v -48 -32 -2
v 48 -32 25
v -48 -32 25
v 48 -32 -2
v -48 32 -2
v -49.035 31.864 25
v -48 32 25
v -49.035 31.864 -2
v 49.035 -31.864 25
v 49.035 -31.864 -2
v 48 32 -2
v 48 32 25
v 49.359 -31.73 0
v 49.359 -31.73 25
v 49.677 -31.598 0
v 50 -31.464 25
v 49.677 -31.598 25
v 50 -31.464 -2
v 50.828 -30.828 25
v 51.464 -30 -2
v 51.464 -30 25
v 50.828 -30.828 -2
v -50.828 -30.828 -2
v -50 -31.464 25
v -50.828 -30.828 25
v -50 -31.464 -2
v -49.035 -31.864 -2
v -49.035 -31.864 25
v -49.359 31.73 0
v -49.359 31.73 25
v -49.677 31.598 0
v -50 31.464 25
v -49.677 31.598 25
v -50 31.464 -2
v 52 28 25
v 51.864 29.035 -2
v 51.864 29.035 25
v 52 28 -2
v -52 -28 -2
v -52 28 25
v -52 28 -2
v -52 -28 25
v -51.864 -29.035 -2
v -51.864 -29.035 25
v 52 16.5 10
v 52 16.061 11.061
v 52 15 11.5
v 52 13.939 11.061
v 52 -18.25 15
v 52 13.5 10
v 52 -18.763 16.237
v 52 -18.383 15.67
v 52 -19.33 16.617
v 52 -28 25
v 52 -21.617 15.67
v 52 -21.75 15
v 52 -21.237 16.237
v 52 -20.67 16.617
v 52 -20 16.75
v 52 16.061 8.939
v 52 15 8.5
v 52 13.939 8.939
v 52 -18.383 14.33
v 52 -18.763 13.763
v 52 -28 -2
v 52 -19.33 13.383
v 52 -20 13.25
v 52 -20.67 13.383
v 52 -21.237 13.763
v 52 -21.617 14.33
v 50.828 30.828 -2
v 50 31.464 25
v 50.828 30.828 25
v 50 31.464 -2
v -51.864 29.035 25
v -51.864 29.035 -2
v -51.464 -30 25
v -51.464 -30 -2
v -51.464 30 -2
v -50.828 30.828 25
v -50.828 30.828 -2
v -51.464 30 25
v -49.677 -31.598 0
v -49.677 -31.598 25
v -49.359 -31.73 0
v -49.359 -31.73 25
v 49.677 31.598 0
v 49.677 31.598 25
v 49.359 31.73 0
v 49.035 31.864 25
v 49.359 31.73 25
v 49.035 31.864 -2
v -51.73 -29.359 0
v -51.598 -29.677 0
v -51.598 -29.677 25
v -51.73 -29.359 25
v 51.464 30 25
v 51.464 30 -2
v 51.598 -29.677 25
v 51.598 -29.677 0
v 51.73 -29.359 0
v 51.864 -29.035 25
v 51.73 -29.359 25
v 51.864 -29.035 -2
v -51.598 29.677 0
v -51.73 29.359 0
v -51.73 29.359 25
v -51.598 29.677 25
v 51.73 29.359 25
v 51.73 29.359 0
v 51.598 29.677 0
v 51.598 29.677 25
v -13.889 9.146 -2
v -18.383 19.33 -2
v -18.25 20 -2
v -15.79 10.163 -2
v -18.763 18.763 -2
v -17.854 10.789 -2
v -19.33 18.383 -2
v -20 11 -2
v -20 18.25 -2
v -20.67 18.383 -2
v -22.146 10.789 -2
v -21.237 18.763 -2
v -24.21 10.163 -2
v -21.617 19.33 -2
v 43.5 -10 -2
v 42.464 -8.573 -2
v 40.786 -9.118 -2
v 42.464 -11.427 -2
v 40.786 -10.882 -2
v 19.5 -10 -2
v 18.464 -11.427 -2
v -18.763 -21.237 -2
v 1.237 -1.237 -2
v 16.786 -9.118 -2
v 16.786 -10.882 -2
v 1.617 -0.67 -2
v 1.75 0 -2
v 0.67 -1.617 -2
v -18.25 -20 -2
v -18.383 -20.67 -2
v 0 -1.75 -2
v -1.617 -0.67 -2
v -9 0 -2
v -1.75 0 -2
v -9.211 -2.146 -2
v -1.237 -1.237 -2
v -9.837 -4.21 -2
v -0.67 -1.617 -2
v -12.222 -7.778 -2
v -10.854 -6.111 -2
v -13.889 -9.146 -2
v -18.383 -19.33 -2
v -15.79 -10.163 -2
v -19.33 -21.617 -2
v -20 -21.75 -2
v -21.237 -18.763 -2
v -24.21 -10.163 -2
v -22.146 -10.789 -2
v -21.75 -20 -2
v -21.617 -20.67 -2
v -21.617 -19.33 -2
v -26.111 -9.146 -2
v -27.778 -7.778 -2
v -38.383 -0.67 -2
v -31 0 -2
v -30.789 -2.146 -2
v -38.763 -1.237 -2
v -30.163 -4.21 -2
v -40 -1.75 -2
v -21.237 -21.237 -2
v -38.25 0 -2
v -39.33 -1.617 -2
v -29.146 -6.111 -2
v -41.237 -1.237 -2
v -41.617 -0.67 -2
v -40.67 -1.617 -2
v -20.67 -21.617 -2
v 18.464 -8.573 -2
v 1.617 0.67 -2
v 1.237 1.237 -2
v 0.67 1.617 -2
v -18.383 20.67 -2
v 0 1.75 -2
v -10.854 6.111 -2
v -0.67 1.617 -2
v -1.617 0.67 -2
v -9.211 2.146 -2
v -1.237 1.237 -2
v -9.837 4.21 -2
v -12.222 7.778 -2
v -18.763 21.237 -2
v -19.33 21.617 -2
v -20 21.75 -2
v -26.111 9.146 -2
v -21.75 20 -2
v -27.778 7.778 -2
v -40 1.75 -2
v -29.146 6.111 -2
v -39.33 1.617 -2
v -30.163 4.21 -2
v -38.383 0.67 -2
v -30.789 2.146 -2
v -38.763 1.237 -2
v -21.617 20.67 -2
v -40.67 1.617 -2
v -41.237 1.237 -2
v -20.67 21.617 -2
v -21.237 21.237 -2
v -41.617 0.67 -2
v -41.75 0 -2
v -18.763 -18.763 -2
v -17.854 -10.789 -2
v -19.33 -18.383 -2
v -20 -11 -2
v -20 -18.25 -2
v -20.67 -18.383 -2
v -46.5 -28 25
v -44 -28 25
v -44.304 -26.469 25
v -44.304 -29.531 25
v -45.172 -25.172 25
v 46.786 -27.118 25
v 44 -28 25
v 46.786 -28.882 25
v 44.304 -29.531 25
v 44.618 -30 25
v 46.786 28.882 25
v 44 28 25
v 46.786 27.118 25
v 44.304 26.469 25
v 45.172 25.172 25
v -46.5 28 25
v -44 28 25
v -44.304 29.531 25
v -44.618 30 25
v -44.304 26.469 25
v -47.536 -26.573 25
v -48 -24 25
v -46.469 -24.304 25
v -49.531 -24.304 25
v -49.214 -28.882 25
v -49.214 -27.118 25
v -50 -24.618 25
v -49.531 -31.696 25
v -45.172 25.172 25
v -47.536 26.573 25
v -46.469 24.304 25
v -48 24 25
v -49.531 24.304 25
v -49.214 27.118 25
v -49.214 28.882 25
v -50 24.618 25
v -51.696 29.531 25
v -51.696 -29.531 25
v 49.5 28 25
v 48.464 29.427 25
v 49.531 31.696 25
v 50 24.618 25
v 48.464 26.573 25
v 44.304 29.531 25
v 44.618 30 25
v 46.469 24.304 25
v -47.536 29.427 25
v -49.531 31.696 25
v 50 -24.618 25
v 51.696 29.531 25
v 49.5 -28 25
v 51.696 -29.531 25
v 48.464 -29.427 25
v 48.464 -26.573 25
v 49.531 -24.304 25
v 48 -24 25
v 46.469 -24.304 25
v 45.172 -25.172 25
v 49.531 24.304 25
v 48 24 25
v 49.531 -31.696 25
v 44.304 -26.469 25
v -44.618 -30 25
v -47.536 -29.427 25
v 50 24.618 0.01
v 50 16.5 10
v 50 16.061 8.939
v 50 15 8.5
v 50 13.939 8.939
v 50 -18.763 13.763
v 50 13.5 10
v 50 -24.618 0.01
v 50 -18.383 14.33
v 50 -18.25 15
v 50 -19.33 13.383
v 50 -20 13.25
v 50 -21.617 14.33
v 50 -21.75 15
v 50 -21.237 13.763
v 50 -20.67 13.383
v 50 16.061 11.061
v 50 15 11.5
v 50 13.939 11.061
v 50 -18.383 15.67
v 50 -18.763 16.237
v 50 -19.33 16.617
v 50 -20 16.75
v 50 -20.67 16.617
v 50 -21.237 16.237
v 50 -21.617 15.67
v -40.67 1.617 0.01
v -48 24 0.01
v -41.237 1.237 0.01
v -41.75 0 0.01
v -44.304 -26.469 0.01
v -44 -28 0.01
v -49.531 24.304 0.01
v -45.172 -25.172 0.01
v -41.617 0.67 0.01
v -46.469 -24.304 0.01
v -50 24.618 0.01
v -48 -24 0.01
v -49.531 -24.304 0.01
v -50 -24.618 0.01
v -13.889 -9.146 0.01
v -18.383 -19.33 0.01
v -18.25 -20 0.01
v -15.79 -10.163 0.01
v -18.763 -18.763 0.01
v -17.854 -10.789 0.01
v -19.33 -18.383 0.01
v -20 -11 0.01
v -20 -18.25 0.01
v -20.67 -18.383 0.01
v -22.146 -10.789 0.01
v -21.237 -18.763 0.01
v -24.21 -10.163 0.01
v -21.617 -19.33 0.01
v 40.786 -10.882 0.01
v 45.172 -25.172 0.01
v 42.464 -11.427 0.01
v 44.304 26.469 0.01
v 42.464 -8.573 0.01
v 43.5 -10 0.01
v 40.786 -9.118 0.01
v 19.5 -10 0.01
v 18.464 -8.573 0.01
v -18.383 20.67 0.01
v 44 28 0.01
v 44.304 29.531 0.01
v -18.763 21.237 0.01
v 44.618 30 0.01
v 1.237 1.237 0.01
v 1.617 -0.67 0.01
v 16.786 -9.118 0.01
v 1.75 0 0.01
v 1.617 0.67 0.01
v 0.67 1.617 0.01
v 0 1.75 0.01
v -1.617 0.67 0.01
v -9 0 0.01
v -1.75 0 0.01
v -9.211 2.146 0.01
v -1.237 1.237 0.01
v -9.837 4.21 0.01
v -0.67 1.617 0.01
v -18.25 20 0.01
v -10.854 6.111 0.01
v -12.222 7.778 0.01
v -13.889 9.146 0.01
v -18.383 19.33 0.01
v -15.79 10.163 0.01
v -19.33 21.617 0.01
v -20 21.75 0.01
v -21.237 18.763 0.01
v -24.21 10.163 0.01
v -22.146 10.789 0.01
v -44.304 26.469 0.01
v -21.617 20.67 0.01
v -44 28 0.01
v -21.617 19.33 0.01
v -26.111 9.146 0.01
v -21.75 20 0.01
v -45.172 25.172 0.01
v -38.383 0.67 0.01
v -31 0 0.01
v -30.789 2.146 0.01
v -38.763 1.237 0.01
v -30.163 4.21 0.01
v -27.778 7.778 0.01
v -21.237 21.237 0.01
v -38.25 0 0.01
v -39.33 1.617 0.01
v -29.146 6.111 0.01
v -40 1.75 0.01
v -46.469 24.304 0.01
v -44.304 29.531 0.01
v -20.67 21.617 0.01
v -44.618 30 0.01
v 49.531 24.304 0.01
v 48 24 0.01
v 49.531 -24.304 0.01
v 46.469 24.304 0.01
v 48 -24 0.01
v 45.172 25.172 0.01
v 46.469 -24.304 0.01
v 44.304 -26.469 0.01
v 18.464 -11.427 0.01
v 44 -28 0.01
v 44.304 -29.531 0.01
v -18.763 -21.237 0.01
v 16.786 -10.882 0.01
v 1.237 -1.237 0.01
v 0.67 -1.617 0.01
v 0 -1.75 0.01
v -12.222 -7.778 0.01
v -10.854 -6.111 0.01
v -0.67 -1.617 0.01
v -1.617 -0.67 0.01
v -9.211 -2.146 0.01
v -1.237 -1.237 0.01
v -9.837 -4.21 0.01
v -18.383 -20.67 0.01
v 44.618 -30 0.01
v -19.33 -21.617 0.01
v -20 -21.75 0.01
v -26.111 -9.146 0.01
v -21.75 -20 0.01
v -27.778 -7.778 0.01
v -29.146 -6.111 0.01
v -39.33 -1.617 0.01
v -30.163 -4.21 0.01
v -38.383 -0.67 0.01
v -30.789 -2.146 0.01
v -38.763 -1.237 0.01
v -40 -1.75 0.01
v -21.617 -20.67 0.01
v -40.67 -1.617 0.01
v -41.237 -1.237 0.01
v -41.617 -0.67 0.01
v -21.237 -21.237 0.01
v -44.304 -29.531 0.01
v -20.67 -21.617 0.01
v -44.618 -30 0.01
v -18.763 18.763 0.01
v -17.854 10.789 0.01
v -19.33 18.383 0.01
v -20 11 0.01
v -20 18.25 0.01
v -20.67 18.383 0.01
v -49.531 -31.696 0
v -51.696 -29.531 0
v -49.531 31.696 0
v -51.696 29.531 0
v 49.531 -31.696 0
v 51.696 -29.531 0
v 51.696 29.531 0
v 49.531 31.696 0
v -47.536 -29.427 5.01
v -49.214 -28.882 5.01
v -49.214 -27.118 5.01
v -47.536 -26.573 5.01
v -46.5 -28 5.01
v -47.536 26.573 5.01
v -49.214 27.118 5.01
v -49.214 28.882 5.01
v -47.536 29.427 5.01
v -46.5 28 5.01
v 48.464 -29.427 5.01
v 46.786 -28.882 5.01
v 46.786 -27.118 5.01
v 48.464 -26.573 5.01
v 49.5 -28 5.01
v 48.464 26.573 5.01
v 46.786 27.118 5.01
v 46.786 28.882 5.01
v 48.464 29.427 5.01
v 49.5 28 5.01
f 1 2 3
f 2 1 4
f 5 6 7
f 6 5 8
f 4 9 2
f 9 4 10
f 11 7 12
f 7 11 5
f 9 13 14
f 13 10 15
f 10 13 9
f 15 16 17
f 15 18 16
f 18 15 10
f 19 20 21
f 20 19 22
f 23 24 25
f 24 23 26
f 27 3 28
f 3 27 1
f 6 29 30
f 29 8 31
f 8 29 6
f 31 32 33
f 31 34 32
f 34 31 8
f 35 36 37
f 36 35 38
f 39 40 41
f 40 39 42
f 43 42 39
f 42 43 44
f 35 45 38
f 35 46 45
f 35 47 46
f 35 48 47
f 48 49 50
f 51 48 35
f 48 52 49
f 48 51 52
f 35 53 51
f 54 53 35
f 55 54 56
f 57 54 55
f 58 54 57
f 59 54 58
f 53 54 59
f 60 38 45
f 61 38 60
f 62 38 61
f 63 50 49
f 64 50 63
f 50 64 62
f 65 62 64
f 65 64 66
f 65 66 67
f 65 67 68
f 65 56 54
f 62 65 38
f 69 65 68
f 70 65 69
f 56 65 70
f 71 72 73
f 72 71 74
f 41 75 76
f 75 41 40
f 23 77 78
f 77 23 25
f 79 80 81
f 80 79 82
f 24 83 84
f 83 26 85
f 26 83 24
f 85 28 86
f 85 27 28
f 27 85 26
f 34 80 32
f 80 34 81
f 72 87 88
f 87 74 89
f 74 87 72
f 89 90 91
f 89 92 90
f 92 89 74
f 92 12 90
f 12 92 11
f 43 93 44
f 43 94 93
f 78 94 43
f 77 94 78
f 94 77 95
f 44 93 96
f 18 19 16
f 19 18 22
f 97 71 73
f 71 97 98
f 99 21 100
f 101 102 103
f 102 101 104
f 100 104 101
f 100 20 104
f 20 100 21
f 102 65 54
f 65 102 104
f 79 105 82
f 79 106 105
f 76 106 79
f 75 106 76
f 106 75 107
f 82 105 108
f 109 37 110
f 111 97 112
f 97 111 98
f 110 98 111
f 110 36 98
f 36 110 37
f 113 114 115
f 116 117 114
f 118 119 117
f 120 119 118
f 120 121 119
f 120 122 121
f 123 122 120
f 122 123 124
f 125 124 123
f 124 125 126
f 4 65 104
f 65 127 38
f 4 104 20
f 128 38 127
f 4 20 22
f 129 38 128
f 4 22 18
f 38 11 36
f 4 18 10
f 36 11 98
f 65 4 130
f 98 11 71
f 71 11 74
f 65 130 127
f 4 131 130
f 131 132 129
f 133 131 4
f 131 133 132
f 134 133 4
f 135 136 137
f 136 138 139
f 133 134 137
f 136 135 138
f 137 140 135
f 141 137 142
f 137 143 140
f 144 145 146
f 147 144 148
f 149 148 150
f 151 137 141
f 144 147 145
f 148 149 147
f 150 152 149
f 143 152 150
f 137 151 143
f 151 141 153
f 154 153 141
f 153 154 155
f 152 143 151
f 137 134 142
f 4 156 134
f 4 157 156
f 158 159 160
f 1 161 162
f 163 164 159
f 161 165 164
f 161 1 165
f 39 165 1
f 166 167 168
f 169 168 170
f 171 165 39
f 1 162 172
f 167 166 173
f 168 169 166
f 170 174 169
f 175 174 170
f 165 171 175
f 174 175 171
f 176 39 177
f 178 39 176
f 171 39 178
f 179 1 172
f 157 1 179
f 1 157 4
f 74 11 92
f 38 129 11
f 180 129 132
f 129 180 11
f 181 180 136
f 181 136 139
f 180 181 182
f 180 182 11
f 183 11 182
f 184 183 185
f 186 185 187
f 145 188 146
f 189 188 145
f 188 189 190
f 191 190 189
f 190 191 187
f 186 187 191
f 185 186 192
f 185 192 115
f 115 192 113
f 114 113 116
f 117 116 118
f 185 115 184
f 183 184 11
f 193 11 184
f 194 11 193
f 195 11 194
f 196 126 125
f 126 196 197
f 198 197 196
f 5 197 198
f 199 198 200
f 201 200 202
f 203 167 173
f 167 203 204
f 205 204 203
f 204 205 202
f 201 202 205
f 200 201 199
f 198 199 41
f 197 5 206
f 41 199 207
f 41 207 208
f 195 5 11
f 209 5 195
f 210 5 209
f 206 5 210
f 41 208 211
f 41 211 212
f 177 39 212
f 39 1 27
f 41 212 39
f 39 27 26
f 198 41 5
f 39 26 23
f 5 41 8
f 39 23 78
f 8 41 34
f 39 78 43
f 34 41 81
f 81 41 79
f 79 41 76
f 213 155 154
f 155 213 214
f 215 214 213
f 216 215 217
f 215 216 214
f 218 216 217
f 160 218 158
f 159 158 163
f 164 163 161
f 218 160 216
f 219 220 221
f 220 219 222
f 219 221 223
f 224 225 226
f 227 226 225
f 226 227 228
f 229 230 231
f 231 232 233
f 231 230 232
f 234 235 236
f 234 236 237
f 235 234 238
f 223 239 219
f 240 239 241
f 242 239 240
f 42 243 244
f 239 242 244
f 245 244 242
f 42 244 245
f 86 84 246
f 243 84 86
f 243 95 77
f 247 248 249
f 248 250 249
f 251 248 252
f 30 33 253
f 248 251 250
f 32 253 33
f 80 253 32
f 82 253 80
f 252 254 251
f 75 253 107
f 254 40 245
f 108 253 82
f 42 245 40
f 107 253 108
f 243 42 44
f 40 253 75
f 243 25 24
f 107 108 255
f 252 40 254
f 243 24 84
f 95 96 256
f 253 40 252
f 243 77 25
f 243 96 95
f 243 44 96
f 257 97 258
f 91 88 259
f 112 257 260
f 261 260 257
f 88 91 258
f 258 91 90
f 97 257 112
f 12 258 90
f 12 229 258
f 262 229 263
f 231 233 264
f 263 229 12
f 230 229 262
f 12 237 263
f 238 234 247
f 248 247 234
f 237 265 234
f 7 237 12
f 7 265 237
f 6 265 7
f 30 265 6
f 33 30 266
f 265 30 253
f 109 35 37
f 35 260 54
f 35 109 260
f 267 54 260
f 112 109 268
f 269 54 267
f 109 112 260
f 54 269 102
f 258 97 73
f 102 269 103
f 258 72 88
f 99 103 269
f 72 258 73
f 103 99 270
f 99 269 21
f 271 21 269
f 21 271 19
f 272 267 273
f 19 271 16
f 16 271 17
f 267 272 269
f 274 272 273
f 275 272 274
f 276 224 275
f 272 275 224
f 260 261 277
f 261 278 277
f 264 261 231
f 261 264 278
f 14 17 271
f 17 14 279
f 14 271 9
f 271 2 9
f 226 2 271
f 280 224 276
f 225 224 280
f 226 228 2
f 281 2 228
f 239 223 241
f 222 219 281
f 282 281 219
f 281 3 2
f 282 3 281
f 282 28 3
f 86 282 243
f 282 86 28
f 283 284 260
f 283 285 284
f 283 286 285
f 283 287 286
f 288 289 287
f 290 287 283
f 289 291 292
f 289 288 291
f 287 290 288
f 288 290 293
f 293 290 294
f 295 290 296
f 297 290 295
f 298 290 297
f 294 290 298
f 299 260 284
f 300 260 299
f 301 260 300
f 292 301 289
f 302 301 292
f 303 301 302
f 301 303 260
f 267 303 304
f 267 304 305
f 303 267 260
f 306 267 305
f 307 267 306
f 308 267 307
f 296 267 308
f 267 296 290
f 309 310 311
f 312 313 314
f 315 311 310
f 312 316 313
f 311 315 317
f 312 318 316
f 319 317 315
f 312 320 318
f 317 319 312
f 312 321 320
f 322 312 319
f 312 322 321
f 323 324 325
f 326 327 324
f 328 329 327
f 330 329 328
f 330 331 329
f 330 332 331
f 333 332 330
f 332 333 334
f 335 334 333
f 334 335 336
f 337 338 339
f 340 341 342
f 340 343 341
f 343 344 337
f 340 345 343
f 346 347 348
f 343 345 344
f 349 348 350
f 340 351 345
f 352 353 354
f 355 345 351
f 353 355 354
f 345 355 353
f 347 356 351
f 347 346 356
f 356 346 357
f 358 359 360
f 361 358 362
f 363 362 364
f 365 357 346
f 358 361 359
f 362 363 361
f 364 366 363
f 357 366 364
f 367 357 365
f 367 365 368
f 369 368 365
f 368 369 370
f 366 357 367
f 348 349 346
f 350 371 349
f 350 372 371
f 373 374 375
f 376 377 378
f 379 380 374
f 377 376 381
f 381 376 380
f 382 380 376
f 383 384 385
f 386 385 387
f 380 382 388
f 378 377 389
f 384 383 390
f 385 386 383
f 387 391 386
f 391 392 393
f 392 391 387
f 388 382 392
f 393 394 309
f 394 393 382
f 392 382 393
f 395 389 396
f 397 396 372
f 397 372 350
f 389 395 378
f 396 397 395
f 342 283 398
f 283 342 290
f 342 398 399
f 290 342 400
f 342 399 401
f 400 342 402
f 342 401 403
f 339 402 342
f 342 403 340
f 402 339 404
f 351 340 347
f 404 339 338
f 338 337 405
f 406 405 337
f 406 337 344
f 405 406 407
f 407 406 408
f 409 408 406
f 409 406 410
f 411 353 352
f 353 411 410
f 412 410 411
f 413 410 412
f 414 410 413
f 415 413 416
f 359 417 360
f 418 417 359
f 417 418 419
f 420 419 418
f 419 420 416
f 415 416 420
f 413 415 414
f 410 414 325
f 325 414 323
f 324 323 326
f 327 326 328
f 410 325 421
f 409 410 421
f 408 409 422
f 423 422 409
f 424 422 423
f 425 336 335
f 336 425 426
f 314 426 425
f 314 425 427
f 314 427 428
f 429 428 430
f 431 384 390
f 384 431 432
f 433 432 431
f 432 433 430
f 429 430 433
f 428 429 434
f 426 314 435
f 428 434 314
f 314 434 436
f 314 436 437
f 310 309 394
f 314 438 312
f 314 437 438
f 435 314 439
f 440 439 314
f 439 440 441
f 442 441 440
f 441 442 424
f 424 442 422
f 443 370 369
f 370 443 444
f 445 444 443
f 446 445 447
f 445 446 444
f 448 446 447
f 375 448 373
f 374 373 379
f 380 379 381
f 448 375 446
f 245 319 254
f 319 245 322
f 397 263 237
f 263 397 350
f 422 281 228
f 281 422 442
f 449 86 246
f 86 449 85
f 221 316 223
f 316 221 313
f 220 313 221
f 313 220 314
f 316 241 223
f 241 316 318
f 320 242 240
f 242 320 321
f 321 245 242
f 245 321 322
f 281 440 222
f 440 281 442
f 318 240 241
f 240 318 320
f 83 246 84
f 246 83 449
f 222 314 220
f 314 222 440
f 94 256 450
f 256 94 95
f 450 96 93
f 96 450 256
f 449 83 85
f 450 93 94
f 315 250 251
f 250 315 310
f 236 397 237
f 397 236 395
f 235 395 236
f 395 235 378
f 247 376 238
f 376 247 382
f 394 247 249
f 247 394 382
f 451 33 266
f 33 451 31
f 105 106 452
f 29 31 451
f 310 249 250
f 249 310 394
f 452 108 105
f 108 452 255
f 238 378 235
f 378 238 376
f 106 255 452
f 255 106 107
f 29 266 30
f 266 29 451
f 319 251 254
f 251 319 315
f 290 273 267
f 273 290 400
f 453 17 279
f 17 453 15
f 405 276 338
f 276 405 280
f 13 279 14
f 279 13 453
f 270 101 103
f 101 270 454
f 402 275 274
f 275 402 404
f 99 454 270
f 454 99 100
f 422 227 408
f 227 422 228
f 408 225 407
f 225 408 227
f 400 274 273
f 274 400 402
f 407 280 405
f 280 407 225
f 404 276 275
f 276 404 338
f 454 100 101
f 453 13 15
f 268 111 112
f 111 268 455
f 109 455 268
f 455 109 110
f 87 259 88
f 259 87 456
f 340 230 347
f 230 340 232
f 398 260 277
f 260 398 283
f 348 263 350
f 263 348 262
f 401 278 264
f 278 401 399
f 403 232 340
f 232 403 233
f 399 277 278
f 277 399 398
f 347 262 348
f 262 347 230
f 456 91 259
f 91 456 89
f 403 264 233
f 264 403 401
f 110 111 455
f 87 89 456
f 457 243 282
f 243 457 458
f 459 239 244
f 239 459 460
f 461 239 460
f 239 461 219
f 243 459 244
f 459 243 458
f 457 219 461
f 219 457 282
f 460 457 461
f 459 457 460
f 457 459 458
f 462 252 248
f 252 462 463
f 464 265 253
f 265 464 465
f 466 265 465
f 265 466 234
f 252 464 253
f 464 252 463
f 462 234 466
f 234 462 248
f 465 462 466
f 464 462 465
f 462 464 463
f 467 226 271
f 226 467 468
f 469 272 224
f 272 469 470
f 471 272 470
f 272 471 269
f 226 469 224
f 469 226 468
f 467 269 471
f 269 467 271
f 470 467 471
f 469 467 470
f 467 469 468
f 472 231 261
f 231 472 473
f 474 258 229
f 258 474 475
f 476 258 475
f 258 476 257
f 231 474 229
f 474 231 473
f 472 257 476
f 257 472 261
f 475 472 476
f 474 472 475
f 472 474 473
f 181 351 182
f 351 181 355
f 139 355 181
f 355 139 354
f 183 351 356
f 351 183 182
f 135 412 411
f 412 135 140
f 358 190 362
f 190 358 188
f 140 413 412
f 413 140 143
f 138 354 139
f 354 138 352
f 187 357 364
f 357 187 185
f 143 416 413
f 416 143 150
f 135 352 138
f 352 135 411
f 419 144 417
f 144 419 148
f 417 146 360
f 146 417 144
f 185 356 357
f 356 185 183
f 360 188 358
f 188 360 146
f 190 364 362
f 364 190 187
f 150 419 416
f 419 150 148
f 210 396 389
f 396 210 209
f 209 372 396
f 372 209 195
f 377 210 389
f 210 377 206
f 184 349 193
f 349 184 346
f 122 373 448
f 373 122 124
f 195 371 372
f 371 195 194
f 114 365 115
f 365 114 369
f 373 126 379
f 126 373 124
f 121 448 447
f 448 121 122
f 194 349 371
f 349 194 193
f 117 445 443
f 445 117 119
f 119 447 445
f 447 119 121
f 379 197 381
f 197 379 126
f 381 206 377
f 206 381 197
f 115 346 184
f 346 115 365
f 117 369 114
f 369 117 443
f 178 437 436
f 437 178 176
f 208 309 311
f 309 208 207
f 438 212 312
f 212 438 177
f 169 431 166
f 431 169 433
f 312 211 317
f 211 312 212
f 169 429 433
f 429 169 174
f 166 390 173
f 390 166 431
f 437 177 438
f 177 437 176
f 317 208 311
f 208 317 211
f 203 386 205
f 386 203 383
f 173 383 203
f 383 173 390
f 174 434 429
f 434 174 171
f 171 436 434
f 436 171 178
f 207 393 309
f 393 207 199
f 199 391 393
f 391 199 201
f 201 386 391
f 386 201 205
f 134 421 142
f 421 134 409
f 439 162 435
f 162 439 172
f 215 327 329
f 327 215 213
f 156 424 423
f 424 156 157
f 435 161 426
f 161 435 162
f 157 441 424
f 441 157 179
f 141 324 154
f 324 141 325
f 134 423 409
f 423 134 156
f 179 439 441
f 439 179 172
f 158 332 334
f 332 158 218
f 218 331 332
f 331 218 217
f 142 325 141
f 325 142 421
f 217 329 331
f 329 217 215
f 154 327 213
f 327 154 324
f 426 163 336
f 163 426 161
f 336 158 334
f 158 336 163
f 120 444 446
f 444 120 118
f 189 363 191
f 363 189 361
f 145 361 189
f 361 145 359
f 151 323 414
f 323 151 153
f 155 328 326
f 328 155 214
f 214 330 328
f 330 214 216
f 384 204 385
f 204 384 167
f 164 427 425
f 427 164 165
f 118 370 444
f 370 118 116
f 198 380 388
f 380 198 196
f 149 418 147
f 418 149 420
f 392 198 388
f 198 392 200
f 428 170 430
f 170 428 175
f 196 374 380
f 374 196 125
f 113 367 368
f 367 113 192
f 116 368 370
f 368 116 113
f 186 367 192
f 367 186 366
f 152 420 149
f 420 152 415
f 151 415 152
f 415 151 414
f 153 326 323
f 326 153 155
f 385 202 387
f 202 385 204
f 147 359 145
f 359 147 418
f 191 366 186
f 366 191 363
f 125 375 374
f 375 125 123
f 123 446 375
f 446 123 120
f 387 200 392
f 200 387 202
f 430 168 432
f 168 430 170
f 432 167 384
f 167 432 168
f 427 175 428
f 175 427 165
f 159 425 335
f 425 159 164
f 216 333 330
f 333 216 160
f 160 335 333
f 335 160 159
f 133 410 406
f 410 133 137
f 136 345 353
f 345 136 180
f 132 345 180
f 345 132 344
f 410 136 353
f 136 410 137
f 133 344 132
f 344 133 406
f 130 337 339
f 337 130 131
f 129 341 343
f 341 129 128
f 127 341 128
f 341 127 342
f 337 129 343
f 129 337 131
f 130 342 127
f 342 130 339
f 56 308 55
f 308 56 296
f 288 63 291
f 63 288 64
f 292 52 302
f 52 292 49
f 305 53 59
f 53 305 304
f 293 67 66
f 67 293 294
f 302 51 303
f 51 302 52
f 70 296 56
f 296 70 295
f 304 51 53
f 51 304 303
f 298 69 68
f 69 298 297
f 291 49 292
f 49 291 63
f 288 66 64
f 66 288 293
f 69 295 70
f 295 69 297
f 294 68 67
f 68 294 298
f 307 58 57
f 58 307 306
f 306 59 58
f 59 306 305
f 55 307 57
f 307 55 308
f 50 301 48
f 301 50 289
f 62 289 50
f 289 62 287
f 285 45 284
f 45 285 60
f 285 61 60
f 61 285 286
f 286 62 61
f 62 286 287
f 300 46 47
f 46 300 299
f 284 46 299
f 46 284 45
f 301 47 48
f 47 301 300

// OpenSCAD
// file: thatbox.scad
module ThatBox_Layout(dims, corner_radius) {
  dx = (dims[0] / 2) - corner_radius;
  dy = (dims[1] / 2) - corner_radius;

  for(x = [-dx, dx]) {
    for(y = [-dy, dy]) {
      translate([x, y]) {
        children();
      }
    }
  }
}

module ThatBox_Plate(dims, thickness, corner_radius) {
  hull() {
    ThatBox_Layout(dims, corner_radius) {
      cylinder(h = thickness, r = corner_radius, $fn = 24);
    }
  }
}

function PlateSize(inner, wall_thickness) = [inner[0] + (wall_thickness * 2), inner[1] + (wall_thickness * 2)];

module ThatBox_Box(
  inner = [120, 80, 30],
  wall_thickness = 2, 
  corner_radius = 4,
  mounting_hole_diameter = 3,
  mounting_hole_depth = 20,
  base_thickness = 3, 
) {
  plate_size = PlateSize(inner, wall_thickness);

  difference() {
    // Outer volume
    translate([0, 0, -base_thickness]) {
      ThatBox_Plate(dims = plate_size, thickness = inner[2] + base_thickness, corner_radius = corner_radius);
    }

    // Inner volume
    translate([0, 0, (inner[2] / 2) + 0.01]) {
      cube(inner, center = true);
    }
  }

  difference() {
    // Mounting hole supports
    ThatBox_Layout(dims = plate_size, corner_radius = corner_radius) {
      cylinder(h = inner[2], r = corner_radius, $fn = 16);
    }

    // Mounting holes
    ThatBox_Layout(dims = plate_size, corner_radius = corner_radius) {
      translate([0, 0, inner[2] - mounting_hole_depth + 0.01]) {
        cylinder(h = mounting_hole_depth, d = mounting_hole_diameter, $fn = 5);
      }
    }
  }
}

module ThatBox_Lid(
  inner = [120, 80, 30],
  wall_thickness = 2, 
  corner_radius = 4,
  mounting_hole_diameter = 3.1,
  lid_thickness = 2,
) {
  plate_size = PlateSize(inner, wall_thickness);

  difference() {
    // Panel
    ThatBox_Plate(dims = plate_size, thickness = lid_thickness, corner_radius = corner_radius);

    // Mounting holes
    ThatBox_Layout(dims = plate_size, corner_radius = corner_radius) {
      translate([0, 0, -1]) {
        cylinder(h = lid_thickness + 2, d = mounting_hole_diameter, $fn = 16);
      }
    }
  }
}

// Demo
color("red") {
  ThatBox_Box();
}
translate([0, 0, 30]) {
  color("blue", 0.5) {
    ThatBox_Lid();
  }
}
// main file
use <thatbox.scad>;

box_inner = [100, 60, 25];
wall_thickness = 2;
base_thickness = 2;

module Box() {
  color("red") {
    difference() {
      ThatBox_Box(
        inner = box_inner,
        wall_thickness = wall_thickness,
        base_thickness = base_thickness
      );

      // Probe mounting holes
      translate([-20, 0, -base_thickness - 0.05]) {
        cylinder(h = base_thickness + 0.1, d = 22, $fn = 32);

        for (i = [0:90:360]) {
          rotate([0, 0, i]) {
            translate([20, 0]) {
              cylinder(h = base_thickness + 0.1, d = 3.5, $fn = 16);
            }
          }
        }
      }

      // Sensor mounting holes
      translate([30, -10, -base_thickness - 0.05]) {
        for (x = [-12, 12]) {
          translate([x, 0]) {
            cylinder(h = base_thickness + 0.1, d = 3, $fn = 5);
          }
        }
      }

      // Cable hole
      translate([(box_inner[0] / 2) - 0.05, -20, 15]) {
        rotate([0, 90, 0]) {
          cylinder(h = wall_thickness + 0.1, d = 3.5, $fn = 16);
        }
      }

      // Vent hole
      translate([(box_inner[0] / 2) - 0.05, 15, 10]) {
        rotate([0, 90, 0]) {
          cylinder(h = wall_thickness + 0.1, d = 3, $fn = 8);
        }
      }
    }
  }
}

module Lid() {
  translate([0, 0, 30]) {
    color("blue", 0.5) {
      projection() {
        ThatBox_Lid(inner = box_inner);
      }
    }
  }
}

Box();
Lid();
